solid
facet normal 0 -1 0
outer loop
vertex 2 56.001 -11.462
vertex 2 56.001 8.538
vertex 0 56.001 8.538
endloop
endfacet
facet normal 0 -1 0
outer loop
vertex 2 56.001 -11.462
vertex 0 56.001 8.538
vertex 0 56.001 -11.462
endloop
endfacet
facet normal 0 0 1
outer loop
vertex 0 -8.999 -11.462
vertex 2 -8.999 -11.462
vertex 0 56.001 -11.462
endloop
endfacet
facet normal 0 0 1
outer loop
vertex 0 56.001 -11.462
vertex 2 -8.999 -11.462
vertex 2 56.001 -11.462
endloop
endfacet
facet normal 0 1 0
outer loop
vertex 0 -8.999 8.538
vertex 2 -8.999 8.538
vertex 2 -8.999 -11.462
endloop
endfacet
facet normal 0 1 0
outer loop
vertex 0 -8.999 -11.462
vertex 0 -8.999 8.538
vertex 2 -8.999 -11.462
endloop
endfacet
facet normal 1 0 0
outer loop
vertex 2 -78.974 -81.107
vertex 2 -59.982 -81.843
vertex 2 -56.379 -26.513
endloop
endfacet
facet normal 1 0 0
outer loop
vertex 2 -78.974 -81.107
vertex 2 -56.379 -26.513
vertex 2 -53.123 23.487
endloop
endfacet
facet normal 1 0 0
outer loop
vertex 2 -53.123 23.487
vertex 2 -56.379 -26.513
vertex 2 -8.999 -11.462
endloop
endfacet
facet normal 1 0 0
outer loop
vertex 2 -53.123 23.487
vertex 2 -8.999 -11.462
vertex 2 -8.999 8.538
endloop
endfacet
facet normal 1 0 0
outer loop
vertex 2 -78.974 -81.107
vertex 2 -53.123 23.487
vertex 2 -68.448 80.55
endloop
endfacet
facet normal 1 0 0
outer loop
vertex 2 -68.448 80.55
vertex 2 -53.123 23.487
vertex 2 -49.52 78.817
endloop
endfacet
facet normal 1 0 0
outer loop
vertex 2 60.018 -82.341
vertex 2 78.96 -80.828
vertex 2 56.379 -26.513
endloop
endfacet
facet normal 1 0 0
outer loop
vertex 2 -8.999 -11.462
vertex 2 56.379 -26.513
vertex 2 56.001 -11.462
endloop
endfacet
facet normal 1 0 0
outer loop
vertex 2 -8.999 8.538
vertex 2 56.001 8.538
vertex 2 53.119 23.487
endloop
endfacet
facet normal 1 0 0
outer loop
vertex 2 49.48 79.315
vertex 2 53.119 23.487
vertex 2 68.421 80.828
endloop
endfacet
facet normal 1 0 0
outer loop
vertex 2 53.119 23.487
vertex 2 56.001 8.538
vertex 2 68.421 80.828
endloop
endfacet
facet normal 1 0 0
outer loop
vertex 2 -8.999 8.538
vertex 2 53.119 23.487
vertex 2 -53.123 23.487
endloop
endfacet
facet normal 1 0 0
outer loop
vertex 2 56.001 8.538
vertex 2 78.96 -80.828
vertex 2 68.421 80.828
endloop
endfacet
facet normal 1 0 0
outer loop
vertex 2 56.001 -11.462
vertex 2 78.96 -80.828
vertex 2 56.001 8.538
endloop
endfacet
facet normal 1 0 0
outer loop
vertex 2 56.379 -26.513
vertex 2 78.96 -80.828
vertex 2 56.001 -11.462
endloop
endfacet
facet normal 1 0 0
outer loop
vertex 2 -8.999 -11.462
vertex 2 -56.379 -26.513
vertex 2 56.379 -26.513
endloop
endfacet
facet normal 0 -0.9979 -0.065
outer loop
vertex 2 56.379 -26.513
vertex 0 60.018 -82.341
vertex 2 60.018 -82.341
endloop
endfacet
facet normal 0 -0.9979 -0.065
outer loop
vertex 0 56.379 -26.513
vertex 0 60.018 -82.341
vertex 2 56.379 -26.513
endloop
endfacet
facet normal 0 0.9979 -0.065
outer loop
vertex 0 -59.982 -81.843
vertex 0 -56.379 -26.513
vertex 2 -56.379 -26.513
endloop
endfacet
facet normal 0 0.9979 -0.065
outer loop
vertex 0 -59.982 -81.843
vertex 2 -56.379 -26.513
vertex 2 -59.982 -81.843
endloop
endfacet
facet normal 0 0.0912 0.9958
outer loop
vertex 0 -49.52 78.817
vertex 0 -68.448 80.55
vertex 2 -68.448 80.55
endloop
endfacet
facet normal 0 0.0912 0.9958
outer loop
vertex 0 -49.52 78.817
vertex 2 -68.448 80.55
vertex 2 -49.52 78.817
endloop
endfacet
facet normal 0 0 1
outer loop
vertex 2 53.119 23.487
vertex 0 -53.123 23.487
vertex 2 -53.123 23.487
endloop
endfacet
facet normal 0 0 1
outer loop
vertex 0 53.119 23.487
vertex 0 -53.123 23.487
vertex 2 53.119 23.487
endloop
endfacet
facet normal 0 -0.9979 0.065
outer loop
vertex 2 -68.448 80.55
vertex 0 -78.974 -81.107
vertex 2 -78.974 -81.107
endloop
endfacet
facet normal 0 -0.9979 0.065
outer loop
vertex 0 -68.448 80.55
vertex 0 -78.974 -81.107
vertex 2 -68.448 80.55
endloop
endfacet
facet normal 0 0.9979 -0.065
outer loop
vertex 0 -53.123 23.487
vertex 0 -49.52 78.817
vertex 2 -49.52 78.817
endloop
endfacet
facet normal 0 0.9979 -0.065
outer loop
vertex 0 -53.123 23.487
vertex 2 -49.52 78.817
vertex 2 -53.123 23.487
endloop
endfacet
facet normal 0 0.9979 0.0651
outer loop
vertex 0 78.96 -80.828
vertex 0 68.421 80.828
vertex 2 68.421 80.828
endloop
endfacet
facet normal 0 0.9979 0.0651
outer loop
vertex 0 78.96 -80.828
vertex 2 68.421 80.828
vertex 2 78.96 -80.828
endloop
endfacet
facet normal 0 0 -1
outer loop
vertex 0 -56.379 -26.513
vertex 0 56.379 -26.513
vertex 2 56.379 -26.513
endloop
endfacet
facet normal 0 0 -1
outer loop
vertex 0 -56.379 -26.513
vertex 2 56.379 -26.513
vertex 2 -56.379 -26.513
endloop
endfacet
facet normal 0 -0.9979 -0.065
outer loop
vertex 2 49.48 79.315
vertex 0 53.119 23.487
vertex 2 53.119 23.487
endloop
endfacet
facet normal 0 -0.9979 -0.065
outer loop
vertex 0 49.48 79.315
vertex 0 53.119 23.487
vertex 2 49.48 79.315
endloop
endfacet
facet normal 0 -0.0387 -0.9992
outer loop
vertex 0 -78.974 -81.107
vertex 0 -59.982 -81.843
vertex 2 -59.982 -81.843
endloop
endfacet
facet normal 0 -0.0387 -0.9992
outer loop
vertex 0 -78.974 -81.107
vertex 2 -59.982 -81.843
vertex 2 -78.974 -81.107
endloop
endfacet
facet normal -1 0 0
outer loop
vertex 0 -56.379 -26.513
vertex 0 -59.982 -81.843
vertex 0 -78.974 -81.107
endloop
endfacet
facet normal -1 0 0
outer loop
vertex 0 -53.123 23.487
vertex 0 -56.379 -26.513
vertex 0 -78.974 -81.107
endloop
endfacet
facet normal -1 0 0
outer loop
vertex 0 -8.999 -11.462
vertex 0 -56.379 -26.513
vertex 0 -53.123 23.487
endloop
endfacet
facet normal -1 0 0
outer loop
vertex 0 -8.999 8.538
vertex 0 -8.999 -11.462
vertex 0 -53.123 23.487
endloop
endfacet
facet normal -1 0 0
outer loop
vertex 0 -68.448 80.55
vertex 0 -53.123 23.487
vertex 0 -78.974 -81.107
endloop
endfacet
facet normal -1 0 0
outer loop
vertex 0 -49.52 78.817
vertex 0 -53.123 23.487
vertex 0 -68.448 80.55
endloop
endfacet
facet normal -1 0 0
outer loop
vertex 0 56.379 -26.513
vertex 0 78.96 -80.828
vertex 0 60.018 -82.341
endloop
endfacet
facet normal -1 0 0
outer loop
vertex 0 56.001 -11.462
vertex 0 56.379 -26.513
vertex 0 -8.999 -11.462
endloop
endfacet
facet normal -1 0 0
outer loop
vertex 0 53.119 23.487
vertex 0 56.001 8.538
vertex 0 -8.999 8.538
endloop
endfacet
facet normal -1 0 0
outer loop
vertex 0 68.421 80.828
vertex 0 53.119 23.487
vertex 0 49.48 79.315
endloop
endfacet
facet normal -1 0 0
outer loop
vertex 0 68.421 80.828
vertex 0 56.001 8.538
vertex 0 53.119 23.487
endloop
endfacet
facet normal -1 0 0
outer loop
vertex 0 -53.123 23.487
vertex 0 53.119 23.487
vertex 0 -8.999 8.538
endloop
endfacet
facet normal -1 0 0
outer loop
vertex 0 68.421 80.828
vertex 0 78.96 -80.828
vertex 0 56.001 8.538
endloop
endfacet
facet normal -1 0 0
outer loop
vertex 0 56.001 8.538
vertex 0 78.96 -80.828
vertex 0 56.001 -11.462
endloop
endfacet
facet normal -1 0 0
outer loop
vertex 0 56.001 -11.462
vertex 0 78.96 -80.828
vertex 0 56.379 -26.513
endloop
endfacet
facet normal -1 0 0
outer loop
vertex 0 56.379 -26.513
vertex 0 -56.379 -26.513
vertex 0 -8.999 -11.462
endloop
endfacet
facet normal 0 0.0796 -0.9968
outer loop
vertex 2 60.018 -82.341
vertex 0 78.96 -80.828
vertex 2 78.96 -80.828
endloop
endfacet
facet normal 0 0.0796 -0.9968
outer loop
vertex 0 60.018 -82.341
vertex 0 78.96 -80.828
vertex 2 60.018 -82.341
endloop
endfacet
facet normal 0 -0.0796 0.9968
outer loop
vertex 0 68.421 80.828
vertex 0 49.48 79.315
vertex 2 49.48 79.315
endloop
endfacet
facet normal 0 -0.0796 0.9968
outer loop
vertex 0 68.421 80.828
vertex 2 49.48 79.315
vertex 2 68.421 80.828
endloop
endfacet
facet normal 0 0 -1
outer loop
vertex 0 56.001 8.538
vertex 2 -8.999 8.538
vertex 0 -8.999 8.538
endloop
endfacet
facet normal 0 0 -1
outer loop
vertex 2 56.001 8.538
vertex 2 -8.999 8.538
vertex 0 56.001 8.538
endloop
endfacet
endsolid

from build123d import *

# Parameters (mm, degrees)
BOSS_EXTRUDE1_DEPTH = 2
SKETCH2_W           = 20
SKETCH2_H           = 65
CUT_EXTRUDE1_DEPTH  = 115.109502301


with BuildPart() as part:
    # Sketch1 → Boss-Extrude1 (new body)
    with BuildSketch(Plane(origin=(0, 0, 0), x_dir=(0, 0, -1), z_dir=(1, 0, 0))):
        Polygon((-23.487008112, -53.123171146), (-23.487008112, 53.119179438), (-79.3154252, 49.479562724), (-80.828417088, 68.421259669), (80.828417088, 78.960138367), (82.341408976, 60.018441422), (26.512991888, 56.378824708), (26.512991888, -56.378824708), (81.84341634, -59.981558578), (81.107293536, -78.973862025), (-80.550377935, -68.447834544), (-78.817432564, -49.520437276), align=None)
    extrude(amount=BOSS_EXTRUDE1_DEPTH)

    # Sketch2 → Cut-Extrude1 (cut, through all)
    with BuildSketch(Plane(origin=(2, 0, 0), x_dir=(0, 0, -1), z_dir=(1, 0, 0))):
        with Locations((1.46172303, 23.500819189)):
            Rectangle(SKETCH2_W, SKETCH2_H)
    extrude(amount=-CUT_EXTRUDE1_DEPTH, mode=Mode.SUBTRACT)


solid = part.part
